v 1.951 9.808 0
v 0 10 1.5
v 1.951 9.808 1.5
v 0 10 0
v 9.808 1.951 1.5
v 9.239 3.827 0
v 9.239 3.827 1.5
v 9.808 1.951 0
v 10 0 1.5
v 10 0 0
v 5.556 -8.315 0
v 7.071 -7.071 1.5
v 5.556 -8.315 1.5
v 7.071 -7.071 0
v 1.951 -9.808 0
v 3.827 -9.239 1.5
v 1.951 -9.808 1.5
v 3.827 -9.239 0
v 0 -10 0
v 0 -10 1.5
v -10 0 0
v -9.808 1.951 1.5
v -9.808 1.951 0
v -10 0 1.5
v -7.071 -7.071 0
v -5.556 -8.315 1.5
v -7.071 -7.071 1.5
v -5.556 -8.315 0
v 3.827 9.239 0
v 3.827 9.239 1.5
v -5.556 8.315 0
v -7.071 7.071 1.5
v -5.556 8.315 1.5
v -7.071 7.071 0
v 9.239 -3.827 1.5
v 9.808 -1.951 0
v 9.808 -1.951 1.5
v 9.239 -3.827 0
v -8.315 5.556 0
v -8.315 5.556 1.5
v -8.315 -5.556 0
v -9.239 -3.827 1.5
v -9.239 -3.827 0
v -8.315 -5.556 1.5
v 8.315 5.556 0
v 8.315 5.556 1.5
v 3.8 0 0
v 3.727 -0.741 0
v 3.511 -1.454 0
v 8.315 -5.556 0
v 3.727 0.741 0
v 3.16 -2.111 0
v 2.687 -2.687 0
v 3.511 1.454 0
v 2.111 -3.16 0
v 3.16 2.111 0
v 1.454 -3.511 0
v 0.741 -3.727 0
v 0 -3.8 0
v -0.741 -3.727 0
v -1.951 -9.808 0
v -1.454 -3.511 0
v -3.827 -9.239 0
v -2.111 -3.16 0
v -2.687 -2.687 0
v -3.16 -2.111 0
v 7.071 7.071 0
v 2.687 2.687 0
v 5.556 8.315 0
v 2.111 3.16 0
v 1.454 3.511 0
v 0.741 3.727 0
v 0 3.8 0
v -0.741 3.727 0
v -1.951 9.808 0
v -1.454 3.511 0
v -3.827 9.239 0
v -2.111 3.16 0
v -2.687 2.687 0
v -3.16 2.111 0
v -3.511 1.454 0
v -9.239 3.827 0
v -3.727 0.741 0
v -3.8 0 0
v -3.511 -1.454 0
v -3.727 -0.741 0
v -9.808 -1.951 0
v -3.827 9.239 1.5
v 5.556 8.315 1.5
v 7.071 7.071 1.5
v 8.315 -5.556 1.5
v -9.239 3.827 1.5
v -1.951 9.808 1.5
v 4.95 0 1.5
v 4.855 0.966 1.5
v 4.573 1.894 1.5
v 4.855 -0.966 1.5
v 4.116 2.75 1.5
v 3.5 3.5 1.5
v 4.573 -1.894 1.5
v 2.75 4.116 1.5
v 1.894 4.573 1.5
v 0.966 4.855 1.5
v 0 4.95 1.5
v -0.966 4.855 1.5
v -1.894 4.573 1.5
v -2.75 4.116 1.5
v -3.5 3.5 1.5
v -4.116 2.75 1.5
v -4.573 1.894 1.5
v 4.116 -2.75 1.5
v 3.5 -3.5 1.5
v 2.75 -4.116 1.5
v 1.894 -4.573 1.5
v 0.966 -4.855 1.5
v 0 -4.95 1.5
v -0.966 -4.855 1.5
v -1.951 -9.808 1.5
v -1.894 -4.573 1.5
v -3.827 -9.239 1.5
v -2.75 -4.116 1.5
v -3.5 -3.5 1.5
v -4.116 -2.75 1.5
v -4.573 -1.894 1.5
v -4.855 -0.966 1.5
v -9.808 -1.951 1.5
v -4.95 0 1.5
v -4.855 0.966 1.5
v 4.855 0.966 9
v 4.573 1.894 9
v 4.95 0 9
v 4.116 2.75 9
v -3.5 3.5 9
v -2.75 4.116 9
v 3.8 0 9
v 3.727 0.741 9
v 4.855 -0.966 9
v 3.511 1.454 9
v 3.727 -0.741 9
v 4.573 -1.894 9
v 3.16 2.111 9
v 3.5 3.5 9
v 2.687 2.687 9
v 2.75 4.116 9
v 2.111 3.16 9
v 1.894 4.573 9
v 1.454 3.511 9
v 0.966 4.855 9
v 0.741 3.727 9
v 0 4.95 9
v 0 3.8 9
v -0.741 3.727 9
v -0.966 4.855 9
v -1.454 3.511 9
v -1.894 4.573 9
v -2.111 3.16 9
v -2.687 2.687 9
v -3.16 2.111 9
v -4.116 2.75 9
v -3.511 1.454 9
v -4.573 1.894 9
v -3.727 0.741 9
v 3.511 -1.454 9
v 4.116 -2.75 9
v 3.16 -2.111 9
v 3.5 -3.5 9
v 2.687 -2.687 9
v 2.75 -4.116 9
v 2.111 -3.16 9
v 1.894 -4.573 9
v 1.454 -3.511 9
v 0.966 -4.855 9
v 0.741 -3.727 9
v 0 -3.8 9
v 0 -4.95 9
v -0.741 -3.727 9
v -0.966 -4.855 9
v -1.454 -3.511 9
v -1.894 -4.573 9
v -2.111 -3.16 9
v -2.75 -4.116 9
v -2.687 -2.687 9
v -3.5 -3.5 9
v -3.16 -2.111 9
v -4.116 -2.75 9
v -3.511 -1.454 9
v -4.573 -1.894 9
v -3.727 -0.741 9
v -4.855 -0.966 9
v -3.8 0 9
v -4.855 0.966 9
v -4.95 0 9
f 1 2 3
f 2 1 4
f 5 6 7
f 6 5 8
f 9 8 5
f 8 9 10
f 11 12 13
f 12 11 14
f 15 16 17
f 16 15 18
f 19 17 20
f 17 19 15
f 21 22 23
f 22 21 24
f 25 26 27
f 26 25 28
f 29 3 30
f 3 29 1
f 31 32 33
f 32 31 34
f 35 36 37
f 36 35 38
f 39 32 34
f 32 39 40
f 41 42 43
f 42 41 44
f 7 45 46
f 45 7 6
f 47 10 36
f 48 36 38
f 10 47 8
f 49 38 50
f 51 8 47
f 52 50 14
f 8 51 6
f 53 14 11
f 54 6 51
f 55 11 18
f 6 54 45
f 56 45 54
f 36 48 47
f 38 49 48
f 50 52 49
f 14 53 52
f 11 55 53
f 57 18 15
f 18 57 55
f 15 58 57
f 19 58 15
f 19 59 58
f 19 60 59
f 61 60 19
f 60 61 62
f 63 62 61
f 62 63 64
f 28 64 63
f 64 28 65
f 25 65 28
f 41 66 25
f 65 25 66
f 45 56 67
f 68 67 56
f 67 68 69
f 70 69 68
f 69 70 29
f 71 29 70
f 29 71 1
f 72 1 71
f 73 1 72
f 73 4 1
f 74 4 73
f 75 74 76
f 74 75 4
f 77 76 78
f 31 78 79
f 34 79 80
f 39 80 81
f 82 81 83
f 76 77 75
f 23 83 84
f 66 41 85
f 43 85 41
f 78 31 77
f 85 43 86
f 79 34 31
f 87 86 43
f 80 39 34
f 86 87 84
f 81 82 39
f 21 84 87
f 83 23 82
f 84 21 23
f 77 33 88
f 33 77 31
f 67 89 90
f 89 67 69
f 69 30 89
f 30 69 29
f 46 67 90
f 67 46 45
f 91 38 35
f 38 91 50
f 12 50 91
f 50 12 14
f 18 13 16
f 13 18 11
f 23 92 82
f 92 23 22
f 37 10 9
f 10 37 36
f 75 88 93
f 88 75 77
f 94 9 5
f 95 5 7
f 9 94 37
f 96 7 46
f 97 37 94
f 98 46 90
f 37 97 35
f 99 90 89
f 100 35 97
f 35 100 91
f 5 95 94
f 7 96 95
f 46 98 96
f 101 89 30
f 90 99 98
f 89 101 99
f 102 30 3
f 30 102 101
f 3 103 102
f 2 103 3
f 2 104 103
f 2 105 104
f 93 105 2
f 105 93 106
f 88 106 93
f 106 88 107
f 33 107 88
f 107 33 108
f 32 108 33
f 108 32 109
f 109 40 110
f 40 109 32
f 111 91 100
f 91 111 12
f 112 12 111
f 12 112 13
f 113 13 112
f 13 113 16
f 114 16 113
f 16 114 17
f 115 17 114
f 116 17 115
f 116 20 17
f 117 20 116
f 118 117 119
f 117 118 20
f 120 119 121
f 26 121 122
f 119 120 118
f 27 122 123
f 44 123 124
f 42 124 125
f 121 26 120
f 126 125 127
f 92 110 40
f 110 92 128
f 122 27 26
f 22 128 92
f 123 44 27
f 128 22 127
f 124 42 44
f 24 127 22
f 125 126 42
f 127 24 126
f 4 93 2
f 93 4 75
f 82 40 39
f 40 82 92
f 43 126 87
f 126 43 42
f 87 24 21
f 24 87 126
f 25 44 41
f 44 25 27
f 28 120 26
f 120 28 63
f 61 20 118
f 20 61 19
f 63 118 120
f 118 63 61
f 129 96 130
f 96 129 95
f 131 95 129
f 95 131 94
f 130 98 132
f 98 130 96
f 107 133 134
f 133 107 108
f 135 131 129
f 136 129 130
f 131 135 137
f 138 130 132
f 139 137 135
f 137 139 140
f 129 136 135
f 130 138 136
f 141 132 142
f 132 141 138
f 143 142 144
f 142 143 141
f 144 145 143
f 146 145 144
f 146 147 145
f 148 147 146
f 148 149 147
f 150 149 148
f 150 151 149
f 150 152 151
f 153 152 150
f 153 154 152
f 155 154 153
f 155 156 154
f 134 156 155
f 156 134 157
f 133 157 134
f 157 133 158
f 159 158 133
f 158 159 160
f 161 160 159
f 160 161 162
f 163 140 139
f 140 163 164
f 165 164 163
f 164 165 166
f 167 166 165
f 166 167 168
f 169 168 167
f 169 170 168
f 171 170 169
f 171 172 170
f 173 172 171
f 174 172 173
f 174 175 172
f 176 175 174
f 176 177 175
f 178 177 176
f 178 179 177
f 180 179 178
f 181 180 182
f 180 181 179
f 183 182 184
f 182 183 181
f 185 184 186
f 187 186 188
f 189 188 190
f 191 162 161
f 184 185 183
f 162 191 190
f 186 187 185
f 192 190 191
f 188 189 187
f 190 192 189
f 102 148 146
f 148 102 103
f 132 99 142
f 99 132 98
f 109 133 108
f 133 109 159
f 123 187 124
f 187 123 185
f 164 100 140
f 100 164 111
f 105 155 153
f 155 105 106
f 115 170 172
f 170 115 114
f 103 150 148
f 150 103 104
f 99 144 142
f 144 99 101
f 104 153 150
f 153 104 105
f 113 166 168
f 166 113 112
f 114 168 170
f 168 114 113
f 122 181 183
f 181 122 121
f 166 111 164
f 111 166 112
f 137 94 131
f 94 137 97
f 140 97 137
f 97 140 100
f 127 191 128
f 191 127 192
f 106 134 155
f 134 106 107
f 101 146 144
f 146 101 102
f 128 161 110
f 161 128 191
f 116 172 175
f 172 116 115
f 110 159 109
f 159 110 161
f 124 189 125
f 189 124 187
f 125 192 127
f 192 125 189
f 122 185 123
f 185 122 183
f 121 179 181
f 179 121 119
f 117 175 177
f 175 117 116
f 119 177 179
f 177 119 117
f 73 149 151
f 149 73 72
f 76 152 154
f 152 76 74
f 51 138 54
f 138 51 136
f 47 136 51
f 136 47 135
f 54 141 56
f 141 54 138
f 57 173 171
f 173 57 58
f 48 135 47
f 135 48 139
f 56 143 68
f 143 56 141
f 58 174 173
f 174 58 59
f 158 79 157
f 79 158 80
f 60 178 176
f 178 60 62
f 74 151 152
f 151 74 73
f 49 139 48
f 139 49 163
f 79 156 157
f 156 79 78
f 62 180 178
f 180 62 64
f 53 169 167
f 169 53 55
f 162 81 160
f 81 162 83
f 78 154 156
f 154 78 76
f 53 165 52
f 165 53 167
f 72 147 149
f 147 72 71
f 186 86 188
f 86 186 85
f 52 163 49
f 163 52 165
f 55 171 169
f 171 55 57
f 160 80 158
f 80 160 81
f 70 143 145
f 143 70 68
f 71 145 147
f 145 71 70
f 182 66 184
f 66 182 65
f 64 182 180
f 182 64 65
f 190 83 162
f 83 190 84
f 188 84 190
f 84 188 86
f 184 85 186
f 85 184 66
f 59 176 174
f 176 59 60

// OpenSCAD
$fn=32;
module boss_only() {
    difference() {
        union() {
            cylinder(d=20, h=1.5);
            cylinder(d=9.9, h=9);
        }
        cylinder(d=7.6, h=9);
    }
}

module boss_plus_rubber() {
    difference() {
        union() {
            cylinder(d=20, h=3.25);
            cylinder(d=9.9, h=9);
            cylinder(d=14.65, h=9-1.75);
        }
        cylinder(d=7.6, h=9);
    }
    
    translate([25, 0, 0]) difference() {
        cylinder(d=20, h=1.75);
        cylinder(d=9.9, h=1.75);
    }
}


boss_only();
